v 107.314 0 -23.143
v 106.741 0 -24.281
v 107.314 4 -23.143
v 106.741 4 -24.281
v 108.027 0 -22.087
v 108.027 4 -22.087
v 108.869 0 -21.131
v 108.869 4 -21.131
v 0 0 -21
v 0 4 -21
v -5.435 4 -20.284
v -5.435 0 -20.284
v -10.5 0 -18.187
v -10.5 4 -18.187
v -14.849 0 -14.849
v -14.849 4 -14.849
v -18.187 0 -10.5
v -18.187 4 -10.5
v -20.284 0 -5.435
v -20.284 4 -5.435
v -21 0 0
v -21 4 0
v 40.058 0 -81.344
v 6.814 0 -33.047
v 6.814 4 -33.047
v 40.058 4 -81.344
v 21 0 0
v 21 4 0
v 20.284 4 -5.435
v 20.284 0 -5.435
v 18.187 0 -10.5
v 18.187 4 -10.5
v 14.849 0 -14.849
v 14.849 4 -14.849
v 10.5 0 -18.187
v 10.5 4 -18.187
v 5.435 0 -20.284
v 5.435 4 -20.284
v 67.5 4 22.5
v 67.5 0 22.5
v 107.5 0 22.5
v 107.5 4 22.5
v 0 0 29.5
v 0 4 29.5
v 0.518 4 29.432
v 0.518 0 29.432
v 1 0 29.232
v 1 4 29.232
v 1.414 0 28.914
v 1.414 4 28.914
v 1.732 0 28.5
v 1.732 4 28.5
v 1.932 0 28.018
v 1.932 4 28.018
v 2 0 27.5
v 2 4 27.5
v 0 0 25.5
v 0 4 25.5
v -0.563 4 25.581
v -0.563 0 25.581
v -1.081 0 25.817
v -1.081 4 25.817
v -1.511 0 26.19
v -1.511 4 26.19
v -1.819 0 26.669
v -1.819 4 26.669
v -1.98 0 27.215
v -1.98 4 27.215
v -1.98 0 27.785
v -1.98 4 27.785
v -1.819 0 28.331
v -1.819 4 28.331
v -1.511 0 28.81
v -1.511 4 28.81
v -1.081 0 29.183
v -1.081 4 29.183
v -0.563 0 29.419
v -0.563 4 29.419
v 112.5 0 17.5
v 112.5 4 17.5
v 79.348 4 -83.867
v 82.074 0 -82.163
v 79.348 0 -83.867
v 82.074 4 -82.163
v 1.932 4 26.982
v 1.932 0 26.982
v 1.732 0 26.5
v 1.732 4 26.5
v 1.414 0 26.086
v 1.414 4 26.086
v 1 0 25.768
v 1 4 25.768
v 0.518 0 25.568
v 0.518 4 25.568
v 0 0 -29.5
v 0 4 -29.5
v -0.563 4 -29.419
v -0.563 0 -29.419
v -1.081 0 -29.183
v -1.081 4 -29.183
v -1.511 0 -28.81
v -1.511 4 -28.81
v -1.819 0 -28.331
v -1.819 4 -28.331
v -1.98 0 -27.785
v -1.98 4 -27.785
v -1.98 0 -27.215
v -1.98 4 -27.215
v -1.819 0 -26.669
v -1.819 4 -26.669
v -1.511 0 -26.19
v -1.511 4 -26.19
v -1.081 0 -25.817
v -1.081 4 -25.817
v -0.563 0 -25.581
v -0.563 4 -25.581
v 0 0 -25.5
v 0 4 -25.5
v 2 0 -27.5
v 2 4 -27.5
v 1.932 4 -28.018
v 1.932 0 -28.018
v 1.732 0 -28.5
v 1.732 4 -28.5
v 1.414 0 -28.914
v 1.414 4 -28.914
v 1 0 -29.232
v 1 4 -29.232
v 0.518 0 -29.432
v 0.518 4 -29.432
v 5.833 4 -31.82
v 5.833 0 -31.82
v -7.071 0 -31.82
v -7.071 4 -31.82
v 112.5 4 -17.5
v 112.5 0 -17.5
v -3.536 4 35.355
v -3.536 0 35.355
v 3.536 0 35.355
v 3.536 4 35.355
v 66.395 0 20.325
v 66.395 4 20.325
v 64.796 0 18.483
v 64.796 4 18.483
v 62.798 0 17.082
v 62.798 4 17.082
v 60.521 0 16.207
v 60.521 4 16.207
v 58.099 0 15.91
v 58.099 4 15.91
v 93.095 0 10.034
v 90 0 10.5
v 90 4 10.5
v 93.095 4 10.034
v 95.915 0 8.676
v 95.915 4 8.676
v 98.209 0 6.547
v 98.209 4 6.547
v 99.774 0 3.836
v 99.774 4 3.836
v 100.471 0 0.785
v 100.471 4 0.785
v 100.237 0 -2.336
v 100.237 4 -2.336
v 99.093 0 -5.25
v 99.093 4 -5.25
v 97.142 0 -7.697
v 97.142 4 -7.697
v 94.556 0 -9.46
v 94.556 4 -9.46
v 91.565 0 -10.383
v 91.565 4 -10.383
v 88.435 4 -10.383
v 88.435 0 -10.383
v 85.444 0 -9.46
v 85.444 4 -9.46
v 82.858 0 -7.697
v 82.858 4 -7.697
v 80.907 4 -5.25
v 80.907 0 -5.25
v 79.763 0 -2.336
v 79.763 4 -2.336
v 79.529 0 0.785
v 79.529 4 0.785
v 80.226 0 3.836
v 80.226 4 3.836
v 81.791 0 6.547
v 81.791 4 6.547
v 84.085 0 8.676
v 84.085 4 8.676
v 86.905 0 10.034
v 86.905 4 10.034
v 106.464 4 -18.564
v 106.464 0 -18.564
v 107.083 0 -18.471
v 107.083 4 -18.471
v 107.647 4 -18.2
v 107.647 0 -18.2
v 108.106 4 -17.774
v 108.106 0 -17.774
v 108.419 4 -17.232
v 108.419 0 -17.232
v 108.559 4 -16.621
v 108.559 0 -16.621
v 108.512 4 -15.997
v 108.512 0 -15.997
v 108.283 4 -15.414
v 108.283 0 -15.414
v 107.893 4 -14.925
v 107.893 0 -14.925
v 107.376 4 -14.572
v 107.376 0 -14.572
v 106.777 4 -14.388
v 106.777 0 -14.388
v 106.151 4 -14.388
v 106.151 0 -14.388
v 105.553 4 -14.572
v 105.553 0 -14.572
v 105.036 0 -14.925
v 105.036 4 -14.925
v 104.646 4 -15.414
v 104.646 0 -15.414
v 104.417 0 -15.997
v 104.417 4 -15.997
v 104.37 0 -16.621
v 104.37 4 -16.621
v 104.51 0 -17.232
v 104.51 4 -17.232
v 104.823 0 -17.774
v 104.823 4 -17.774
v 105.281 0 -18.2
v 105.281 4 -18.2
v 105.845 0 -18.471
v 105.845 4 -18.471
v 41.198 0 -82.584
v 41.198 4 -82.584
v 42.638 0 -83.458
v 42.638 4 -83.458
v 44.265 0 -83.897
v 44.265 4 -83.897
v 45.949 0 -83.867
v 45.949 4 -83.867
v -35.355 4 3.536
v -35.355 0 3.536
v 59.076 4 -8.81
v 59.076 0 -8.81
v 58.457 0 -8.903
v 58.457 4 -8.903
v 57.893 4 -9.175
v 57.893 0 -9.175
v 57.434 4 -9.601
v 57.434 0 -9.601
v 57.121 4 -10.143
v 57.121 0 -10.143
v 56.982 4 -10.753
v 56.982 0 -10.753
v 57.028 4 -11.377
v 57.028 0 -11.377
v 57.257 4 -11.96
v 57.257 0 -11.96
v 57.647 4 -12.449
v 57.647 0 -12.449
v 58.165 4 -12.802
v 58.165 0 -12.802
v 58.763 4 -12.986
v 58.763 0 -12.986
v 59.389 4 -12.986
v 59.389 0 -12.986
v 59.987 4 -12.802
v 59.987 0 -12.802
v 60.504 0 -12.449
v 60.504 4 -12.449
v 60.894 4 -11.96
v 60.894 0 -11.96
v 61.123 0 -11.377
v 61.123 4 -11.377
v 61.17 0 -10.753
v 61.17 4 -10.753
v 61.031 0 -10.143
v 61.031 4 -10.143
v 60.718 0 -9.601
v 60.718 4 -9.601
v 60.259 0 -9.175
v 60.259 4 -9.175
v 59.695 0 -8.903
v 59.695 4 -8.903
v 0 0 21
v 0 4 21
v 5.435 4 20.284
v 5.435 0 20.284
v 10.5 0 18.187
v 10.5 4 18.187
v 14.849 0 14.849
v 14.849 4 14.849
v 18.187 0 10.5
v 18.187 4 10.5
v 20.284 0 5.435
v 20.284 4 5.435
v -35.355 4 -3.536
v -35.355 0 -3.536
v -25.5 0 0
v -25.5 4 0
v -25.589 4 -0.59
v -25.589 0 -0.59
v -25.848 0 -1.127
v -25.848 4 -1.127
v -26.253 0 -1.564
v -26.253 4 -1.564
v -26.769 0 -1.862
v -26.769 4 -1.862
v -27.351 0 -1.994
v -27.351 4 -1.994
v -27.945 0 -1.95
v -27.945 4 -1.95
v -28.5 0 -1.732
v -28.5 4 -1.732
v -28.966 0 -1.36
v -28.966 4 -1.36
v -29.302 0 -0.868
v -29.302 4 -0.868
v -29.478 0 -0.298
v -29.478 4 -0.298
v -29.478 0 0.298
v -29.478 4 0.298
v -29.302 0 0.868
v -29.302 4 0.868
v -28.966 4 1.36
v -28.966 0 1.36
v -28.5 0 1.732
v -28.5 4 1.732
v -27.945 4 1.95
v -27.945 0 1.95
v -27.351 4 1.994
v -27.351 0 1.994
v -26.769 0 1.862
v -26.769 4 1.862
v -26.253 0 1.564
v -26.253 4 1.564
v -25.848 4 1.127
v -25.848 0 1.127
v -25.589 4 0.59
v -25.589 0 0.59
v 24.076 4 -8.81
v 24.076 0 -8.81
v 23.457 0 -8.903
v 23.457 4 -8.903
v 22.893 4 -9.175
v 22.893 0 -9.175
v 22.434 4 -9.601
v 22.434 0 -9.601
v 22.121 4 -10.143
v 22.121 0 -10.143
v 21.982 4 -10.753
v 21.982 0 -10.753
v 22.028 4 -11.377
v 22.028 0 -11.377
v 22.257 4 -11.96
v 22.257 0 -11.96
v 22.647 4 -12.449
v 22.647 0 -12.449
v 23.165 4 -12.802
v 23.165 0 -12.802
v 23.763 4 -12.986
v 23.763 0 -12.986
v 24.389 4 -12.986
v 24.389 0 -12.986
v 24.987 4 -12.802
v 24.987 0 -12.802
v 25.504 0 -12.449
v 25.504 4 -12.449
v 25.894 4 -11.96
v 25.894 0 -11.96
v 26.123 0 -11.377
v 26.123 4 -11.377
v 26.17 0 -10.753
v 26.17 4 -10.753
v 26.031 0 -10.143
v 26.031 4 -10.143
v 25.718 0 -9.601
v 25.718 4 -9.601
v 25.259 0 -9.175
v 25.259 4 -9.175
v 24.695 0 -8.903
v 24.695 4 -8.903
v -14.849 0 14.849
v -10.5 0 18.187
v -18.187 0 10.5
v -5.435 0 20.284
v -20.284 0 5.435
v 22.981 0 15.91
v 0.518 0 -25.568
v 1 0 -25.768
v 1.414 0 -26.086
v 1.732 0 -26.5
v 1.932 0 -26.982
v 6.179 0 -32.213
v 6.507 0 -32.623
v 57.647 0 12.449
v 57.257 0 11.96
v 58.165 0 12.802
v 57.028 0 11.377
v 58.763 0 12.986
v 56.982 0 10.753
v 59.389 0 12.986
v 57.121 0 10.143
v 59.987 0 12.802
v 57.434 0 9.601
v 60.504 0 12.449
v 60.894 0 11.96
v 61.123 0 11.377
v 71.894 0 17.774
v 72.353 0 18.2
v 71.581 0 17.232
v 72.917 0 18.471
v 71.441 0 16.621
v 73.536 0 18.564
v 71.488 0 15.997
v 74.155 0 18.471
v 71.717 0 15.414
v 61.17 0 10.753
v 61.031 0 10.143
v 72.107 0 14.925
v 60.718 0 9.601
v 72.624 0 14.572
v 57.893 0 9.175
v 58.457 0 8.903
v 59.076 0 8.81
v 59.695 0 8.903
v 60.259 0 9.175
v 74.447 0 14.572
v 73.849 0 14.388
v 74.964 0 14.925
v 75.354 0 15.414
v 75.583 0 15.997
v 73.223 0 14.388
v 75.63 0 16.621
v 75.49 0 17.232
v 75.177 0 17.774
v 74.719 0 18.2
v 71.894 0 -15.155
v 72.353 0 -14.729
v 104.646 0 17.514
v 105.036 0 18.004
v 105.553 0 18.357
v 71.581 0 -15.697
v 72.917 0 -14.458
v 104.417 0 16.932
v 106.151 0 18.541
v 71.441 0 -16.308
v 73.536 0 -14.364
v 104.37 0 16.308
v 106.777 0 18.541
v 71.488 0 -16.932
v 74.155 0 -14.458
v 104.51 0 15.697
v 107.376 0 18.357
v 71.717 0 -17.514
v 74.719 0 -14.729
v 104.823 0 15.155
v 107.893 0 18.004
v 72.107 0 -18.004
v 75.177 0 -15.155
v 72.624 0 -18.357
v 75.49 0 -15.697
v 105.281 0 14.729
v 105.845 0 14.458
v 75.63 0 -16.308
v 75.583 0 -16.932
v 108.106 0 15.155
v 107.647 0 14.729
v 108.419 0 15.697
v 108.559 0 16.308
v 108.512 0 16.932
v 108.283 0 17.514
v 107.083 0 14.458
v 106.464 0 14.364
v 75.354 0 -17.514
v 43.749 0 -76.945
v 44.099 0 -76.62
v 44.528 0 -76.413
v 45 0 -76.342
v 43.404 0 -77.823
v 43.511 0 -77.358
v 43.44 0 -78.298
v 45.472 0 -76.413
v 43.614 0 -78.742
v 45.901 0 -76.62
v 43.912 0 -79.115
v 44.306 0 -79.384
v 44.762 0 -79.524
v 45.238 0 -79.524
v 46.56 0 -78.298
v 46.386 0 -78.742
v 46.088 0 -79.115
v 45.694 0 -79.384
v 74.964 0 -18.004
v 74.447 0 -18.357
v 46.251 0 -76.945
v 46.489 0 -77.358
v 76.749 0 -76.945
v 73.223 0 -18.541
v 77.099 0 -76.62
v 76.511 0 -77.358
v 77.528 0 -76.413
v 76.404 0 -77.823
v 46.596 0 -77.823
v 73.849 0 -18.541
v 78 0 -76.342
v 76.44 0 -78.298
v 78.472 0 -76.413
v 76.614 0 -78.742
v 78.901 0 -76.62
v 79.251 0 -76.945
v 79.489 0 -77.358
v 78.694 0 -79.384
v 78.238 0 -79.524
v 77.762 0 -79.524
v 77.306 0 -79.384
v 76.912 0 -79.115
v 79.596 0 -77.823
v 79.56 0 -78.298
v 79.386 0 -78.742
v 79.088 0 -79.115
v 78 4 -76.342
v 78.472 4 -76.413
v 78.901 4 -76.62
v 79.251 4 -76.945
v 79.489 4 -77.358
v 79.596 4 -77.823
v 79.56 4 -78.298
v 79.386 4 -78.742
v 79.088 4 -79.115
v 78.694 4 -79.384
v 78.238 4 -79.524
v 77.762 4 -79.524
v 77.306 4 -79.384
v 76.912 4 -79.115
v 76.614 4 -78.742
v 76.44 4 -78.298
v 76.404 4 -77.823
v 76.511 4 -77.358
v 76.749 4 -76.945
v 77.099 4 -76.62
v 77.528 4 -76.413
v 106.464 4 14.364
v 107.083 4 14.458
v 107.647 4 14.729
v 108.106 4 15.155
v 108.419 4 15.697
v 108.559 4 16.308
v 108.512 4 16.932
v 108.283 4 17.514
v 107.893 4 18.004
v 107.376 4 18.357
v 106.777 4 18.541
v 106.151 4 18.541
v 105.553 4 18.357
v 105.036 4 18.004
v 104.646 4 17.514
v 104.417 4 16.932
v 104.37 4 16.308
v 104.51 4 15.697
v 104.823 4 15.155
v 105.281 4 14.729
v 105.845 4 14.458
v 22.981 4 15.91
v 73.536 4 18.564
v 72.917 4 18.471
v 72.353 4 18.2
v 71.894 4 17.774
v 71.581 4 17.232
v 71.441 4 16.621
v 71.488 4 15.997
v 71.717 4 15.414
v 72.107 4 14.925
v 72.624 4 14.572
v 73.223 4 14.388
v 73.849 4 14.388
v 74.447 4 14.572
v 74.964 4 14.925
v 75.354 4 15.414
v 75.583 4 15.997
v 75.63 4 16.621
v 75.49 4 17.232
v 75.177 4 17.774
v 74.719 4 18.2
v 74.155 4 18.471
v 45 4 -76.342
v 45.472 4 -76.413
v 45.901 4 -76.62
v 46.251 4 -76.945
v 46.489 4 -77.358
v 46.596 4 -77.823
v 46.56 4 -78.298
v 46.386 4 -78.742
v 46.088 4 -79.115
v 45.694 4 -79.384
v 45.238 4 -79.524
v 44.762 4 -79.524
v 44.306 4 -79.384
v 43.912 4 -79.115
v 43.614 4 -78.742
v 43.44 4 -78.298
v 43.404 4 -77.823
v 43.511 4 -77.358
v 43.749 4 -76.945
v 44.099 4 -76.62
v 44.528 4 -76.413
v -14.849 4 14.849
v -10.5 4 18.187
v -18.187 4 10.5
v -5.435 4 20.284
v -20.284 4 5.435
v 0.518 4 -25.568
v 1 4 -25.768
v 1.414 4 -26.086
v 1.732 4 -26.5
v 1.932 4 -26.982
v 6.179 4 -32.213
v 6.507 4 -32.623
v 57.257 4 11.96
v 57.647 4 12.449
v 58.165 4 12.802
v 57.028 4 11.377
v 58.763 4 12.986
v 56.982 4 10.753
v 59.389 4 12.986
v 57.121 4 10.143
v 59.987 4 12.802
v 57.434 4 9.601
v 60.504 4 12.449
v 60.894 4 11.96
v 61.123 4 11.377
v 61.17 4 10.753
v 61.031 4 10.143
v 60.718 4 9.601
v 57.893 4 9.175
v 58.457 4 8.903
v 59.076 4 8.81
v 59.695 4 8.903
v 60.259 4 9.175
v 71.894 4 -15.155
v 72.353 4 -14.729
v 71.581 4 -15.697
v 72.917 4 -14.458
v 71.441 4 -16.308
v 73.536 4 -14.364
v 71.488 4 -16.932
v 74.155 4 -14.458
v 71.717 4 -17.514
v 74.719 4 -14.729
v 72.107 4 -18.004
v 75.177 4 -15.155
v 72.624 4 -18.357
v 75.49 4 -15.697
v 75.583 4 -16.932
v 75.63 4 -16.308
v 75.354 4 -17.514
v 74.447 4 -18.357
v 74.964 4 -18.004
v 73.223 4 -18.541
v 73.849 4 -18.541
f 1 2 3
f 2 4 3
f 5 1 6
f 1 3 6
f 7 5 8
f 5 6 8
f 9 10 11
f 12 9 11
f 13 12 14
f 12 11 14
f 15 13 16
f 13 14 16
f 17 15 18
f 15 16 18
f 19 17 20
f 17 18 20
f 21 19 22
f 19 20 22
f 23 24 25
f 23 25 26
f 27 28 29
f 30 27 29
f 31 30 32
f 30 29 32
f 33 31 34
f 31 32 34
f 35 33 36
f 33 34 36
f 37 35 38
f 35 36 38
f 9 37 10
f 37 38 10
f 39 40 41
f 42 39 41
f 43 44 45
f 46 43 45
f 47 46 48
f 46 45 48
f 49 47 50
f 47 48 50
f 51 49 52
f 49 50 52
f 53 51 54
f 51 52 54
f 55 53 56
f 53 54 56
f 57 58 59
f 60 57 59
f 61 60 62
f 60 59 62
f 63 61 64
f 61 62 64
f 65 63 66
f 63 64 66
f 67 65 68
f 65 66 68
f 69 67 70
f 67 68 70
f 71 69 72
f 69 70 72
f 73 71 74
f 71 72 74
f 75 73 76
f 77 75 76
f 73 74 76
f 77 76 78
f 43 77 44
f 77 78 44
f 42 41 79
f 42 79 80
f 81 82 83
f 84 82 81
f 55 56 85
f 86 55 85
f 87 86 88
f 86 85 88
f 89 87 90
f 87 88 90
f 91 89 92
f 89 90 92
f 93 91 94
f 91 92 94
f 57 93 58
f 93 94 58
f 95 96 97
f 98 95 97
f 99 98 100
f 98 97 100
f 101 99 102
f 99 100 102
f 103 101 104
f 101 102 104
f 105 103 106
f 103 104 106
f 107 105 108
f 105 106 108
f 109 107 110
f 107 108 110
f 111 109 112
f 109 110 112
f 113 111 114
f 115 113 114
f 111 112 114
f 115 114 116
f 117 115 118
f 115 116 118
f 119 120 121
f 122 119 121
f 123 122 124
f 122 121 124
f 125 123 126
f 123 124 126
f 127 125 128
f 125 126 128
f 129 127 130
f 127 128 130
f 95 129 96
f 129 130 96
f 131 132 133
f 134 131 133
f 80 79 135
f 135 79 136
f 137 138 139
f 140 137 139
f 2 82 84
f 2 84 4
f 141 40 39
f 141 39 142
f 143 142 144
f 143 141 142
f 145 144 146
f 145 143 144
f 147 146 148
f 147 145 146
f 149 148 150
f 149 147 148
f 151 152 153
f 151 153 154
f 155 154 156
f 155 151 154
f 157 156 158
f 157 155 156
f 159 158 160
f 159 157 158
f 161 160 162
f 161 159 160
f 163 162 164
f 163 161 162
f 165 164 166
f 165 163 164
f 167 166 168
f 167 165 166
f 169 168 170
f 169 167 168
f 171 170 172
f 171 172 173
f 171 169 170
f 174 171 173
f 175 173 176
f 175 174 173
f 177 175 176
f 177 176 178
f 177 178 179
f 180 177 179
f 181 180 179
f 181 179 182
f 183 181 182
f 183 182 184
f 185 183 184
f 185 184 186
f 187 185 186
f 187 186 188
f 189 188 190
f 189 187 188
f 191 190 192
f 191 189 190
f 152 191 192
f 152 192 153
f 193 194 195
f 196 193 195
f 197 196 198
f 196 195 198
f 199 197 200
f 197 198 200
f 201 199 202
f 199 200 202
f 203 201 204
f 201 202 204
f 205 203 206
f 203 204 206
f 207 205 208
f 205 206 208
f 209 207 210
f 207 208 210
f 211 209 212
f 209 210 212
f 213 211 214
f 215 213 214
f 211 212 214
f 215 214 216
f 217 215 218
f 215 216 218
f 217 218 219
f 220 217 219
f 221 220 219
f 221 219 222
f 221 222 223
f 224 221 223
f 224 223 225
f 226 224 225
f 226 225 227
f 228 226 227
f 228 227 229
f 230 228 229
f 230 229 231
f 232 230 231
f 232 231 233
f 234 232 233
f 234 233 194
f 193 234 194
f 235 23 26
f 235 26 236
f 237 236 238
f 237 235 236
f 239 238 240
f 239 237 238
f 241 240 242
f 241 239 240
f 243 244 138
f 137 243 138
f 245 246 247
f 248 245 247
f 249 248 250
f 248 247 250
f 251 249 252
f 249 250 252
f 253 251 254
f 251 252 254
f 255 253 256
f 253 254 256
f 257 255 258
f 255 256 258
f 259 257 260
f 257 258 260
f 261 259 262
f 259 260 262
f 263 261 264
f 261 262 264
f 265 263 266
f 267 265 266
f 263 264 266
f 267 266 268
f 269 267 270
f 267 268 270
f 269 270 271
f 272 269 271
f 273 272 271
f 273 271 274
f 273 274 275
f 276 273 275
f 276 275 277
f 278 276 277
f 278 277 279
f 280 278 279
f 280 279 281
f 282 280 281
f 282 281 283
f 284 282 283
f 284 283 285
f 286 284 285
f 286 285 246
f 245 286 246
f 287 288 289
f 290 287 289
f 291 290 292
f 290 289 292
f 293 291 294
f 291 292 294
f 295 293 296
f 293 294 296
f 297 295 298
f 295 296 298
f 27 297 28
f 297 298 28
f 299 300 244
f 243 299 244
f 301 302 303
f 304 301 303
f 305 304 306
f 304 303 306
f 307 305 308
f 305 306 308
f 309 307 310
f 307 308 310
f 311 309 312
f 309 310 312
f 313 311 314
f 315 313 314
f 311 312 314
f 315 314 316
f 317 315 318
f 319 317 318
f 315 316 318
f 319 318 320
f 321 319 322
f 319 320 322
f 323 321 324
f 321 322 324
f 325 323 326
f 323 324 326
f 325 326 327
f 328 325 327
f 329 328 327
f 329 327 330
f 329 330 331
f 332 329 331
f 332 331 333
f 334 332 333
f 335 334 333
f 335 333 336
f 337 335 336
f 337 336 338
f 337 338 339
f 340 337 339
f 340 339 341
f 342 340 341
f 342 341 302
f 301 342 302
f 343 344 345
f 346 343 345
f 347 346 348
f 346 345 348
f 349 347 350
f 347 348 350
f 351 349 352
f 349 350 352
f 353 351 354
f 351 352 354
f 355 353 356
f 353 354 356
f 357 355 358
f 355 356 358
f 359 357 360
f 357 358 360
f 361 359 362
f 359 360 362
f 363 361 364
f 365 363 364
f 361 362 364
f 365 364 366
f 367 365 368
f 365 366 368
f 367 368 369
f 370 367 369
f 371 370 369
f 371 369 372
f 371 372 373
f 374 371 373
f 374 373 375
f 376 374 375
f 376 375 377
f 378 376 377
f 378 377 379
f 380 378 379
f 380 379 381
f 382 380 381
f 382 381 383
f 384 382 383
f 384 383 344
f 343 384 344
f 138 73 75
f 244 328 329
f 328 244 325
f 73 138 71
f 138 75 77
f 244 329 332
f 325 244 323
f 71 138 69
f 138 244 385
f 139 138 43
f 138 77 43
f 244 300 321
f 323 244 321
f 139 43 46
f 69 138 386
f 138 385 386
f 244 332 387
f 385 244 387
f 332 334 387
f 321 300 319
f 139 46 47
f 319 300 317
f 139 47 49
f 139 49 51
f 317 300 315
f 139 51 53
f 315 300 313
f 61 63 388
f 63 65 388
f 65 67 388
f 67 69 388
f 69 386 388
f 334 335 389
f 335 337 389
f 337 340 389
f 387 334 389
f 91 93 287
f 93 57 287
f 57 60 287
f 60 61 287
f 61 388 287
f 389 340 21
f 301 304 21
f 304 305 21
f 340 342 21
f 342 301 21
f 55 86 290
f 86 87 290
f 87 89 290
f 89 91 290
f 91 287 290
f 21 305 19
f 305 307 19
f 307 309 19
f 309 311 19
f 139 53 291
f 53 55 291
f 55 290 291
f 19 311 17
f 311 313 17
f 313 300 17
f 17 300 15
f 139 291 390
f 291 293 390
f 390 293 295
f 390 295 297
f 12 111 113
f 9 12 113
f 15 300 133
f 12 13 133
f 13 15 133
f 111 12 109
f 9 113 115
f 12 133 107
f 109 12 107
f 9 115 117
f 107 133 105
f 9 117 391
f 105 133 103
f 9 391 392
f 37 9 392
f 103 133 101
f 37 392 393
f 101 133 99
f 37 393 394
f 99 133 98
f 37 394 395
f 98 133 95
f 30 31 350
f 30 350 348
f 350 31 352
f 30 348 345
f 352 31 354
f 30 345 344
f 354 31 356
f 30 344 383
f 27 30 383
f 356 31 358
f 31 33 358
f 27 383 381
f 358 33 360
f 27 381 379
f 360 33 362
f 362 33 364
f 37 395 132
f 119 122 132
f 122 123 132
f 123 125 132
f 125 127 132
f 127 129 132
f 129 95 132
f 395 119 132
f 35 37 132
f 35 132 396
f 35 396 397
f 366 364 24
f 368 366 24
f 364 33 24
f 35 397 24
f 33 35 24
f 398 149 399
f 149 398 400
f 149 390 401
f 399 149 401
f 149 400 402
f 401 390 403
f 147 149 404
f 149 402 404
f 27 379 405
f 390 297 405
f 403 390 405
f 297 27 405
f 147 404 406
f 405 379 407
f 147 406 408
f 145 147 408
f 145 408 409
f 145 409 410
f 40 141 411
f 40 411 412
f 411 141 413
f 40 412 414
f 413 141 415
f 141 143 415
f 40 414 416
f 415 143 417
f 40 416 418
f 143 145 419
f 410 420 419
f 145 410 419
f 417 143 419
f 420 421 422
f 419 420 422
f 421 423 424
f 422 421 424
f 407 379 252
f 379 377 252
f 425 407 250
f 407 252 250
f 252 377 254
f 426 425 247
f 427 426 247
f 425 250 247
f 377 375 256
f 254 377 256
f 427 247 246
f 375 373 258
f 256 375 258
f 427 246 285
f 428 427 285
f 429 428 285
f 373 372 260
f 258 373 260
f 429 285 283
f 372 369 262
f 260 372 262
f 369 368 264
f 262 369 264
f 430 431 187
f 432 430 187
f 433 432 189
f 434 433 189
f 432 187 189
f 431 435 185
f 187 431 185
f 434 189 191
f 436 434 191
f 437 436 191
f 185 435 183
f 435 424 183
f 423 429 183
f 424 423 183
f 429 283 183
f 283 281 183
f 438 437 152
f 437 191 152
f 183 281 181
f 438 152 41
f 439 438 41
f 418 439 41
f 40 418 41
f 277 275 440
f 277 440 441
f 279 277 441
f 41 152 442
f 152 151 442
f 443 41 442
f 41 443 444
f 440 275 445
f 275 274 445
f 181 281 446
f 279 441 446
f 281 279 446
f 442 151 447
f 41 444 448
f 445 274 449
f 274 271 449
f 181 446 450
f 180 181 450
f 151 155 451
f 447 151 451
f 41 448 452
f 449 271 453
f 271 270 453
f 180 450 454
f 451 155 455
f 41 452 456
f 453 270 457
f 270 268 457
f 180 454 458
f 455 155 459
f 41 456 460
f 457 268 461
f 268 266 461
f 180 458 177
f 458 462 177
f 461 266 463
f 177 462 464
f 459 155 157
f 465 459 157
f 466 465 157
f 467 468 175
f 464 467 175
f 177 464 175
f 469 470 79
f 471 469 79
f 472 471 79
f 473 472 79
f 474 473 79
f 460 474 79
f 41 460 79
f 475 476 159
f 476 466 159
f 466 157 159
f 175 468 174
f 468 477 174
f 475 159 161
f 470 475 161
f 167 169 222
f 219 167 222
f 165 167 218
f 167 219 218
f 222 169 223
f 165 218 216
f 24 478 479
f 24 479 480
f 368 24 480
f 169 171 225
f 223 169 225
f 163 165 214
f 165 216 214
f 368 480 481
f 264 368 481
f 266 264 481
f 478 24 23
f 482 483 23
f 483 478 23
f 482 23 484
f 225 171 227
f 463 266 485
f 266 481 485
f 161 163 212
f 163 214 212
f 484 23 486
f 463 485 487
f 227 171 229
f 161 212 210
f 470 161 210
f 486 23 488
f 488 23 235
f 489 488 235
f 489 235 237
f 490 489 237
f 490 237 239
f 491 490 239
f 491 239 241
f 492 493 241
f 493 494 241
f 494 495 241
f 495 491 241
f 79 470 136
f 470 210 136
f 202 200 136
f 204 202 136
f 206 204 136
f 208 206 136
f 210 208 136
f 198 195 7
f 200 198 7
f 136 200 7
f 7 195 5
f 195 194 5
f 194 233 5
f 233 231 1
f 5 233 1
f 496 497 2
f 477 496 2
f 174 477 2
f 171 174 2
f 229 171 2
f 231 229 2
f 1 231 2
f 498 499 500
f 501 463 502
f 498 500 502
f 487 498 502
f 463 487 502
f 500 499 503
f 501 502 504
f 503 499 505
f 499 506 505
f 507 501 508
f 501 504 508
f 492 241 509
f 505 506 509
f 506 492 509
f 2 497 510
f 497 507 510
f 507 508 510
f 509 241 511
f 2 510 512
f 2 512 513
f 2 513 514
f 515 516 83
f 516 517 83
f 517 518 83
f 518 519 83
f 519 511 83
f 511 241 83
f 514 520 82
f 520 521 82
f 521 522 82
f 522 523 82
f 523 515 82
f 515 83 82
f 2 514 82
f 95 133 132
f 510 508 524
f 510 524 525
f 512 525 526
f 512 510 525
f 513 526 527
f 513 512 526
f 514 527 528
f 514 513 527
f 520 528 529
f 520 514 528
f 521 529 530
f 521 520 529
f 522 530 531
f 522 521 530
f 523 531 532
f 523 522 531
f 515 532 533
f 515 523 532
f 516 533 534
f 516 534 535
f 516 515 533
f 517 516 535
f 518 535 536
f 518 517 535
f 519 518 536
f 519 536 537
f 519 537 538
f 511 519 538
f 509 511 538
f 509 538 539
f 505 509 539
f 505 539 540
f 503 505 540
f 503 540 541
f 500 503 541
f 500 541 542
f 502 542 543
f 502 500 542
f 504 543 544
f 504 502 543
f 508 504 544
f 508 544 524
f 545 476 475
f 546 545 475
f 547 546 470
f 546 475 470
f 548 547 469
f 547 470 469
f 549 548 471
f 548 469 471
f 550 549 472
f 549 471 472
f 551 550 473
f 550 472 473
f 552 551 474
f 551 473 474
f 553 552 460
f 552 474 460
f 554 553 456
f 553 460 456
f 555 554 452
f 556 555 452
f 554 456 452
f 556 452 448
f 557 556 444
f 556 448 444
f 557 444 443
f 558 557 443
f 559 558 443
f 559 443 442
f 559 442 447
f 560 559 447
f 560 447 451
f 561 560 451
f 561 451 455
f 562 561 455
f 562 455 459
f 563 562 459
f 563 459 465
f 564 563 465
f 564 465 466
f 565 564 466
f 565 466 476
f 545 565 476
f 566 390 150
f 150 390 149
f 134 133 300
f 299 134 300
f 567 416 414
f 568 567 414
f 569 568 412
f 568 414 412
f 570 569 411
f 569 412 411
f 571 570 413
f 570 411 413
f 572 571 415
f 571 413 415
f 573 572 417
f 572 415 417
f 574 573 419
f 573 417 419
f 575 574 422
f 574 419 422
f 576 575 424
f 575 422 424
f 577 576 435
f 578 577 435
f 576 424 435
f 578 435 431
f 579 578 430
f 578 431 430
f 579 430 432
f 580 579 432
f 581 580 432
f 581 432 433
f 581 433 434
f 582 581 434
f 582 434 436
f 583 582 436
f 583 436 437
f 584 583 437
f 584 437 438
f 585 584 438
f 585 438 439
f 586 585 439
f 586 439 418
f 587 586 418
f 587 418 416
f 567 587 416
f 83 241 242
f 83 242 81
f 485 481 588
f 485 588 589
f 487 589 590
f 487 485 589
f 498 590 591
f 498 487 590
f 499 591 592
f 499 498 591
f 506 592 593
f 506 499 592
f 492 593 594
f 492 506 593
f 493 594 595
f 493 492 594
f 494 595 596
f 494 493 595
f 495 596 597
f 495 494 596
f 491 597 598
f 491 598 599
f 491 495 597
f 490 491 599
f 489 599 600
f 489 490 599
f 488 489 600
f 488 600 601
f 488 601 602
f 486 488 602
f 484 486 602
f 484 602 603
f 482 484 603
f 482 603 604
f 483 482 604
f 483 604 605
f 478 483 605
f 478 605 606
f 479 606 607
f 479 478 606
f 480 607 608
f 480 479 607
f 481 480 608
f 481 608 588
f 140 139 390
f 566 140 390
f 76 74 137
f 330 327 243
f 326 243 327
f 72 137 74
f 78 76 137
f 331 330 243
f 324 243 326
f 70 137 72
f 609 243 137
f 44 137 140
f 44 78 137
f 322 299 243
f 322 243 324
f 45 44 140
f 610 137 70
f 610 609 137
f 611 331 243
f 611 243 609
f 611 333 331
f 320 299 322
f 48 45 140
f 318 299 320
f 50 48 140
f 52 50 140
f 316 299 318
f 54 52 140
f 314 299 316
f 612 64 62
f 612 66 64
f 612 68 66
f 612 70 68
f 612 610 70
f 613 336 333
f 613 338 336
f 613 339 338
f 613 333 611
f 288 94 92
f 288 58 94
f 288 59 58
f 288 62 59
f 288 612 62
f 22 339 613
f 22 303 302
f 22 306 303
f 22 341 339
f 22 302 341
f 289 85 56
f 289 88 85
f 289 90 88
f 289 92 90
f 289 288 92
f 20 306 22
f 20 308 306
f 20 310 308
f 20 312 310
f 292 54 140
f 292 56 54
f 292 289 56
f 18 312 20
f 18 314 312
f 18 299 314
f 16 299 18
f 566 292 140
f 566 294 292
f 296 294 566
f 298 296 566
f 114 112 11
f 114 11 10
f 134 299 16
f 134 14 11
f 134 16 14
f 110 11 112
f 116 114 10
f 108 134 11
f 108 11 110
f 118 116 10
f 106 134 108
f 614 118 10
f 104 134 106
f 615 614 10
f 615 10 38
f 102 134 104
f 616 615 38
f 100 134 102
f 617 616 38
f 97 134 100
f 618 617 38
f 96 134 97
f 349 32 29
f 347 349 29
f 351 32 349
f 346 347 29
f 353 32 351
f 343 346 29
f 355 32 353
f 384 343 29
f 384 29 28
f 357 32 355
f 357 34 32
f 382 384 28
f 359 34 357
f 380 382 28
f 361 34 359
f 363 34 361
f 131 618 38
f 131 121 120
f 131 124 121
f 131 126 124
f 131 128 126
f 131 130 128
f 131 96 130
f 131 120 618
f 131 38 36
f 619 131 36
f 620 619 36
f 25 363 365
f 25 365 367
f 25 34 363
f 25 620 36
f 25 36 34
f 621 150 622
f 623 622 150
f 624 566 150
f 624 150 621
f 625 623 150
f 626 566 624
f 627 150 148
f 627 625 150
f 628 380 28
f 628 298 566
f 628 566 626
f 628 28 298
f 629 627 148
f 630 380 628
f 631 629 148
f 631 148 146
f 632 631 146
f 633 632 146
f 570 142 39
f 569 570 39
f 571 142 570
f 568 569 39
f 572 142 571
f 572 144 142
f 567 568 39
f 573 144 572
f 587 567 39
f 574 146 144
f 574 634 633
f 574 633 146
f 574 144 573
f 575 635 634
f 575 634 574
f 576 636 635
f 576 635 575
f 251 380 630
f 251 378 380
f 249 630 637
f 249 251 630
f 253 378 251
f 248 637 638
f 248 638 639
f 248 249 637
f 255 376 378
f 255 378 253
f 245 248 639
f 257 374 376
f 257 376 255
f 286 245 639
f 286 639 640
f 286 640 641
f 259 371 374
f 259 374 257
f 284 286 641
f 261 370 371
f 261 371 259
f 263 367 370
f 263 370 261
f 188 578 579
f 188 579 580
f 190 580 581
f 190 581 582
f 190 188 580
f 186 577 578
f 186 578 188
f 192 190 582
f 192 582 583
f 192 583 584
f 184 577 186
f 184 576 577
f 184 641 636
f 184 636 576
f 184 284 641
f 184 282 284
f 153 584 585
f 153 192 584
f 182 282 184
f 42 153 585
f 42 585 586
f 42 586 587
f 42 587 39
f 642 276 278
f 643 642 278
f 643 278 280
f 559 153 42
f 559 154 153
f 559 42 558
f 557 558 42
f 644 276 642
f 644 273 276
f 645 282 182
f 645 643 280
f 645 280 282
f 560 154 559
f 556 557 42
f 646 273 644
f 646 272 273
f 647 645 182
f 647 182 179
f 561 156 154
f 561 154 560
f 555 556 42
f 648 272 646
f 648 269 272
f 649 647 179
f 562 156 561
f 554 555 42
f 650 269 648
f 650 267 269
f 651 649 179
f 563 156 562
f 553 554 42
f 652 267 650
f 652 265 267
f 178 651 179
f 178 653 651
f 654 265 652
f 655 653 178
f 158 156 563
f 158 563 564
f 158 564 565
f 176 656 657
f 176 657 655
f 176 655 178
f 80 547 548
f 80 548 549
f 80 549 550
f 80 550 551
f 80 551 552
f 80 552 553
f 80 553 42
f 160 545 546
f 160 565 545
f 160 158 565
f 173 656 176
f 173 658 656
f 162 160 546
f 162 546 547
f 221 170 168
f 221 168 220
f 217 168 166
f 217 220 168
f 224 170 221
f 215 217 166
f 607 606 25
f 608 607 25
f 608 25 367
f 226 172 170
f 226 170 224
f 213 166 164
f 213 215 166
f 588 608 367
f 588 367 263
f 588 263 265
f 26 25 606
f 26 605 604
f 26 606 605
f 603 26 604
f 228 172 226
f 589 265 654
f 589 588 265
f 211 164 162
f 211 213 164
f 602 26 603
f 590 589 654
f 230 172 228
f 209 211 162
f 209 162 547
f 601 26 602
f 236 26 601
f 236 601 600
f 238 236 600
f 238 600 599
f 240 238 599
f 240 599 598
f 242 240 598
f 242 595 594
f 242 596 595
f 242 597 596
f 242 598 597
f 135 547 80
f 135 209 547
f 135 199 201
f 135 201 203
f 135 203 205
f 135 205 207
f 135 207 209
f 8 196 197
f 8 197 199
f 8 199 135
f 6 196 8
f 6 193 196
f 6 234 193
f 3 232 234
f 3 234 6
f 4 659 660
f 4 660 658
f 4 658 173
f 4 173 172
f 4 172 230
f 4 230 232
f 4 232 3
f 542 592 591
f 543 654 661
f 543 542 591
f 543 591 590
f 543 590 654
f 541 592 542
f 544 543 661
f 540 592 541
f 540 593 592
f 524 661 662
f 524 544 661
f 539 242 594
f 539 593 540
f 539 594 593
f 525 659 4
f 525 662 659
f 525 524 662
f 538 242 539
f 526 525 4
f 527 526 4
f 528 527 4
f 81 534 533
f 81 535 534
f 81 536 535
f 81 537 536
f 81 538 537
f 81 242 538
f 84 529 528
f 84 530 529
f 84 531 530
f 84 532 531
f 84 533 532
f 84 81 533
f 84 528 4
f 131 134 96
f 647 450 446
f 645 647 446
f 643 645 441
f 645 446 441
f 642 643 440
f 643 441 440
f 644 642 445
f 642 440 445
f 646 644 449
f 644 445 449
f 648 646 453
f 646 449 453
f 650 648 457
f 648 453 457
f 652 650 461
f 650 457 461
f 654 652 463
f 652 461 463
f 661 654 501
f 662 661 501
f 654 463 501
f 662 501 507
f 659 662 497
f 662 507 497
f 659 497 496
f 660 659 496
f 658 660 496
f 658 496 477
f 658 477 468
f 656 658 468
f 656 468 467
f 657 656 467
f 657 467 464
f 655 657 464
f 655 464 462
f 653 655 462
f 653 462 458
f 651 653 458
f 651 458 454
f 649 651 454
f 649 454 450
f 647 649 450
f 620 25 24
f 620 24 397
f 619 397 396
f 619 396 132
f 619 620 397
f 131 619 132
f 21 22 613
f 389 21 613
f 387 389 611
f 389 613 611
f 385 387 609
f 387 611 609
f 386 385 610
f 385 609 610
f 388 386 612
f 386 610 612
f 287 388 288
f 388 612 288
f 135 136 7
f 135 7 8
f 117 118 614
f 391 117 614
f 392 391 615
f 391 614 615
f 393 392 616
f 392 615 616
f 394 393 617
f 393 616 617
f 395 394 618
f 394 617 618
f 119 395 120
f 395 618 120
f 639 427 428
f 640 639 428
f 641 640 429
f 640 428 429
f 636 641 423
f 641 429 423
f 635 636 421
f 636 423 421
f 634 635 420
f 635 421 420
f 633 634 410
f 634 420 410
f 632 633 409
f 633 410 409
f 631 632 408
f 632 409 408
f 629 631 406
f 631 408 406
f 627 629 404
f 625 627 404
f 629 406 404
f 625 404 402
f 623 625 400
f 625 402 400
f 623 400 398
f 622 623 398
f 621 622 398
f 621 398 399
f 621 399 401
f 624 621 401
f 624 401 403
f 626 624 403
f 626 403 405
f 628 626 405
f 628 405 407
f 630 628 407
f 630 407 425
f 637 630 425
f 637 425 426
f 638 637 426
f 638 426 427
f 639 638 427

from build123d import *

# Parameters (mm, degrees)
SKETCH_1_R          = 2.1
SKETCH_1_R_2        = 10.5
SKETCH_1_R_3        = 10
EXTRUDE_1_DEPTH     = 4
CHAMFER_1_SIZE      = 5
FILLET_1_R          = 10
SKETCH_2_R          = 2.1
CUT_EXTRUDE_1_DEPTH = 10
EXTRUDE_START       = -4
SKETCH_3_R          = 1.6
EXTRUDE_2_DEPTH     = 4
FILLET_2_R          = 3
FILLET_3_R          = 11
SKETCH_4_R          = 1.6
EXTRUDE_3_DEPTH     = 4
FILLET_4_R          = 10
CHAMFER_2_SIZE      = 2
CHAMFER_2_SIZE2     = 1.851556395
FILLET_5_R          = 10
SKETCH_5_R          = 17.5
CUT_EXTRUDE_2_DEPTH = 10
SKETCH_7_R          = 2.1
EXTRUDE_9_DEPTH     = 4
EXTRUDE_10_DEPTH    = 8
EXTRUDE_11_DEPTH    = 4


with BuildPart() as part:
    # 草图1 → 凸台-拉伸1 (new body)
    with BuildSketch(Plane(origin=(0, 0, 0), x_dir=(1, 0, 0), z_dir=(0, 1, 0))):
        Polygon((0, 31.819805153), (-31.819805153, 0), (0, -31.819805153), (15.909902577, -15.909902577), (67.5, -15.909902577), (67.5, -22.5), (112.5, -22.5), (112.5, 22.5), (67.5, 22.5), (67.5, 15.909902577), (15.909902577, 15.909902577), align=None)
        with Locations(Location((0, 14, 0), (0, 0, 270))):
            Circle(SKETCH_1_R, mode=Mode.SUBTRACT)
        with Locations(Location((14, 0, 0), (0, 0, 270))):
            Circle(SKETCH_1_R, mode=Mode.SUBTRACT)
        with Locations(Location((0, -14, 0), (0, 0, 270))):
            Circle(SKETCH_1_R, mode=Mode.SUBTRACT)
        with Locations(Location((-14, 0, 0), (0, 0, 270))):
            Circle(SKETCH_1_R, mode=Mode.SUBTRACT)
        with Locations(Location((90, 0, 0), (0, 0, 270))):
            Circle(SKETCH_1_R_2, mode=Mode.SUBTRACT)
        with Locations(Location((0, 22.5, 0), (0, 0, 270))):
            Circle(SKETCH_1_R, mode=Mode.SUBTRACT)
        with Locations(Location((0, -22.5, 0), (0, 0, 270))):
            Circle(SKETCH_1_R, mode=Mode.SUBTRACT)
        with Locations(Location((0, 0, 0), (0, 0, 270))):
            Circle(SKETCH_1_R_3, mode=Mode.SUBTRACT)
        with Locations(Location((-22.5, 0, 0), (0, 0, 270))):
            Circle(SKETCH_1_R, mode=Mode.SUBTRACT)
    extrude(amount=EXTRUDE_1_DEPTH)

    # 倒角1
    chamfer_1_edges = [part.edges().sort_by_distance(p)[0] for p in [
        (112.5, 2, -22.5),
        (112.5, 2, 22.5),
        (0, 2, 31.819805153),
        (-31.819805153, 2, 0),
        (0, 2, -31.819805153),
    ]]
    chamfer(chamfer_1_edges, length=CHAMFER_1_SIZE)

    # 圆角1
    # the kernel refuses this fillet: 10 mm, written as the material it adds along each edge
    with BuildSketch(Plane(origin=(15.909902577, 0, -15.909902577), x_dir=(-0.707106781186552, 0, -0.707106781186543), z_dir=(0, 1, 0))) as fillet_1_piece_1:
        with BuildLine():
            CenterArc((FILLET_1_R * 0.414213562373, -FILLET_1_R), FILLET_1_R, 90, 45)
            Line((-FILLET_1_R * 0.292893218813, -FILLET_1_R * 0.292893218813), (-FILLET_1_R * 0.307035354437, -FILLET_1_R * 0.27875108319))
            Line((-FILLET_1_R * 0.307035354437, -FILLET_1_R * 0.27875108319), (-FILLET_1_R * 0.00828427124746, FILLET_1_R * 0.02))
            Line((-FILLET_1_R * 0.00828427124746, FILLET_1_R * 0.02), (FILLET_1_R * 0.414213562373, FILLET_1_R * 0.02))
            Line((FILLET_1_R * 0.414213562373, FILLET_1_R * 0.02), (FILLET_1_R * 0.414213562373, 0))
        make_face()
    extrude(amount=4)
    with BuildSketch(Plane(origin=(15.909902577, 0, 15.909902577), x_dir=(-0.7071067811865422, 0, 0.707106781186553), z_dir=(0, 1, 0))) as fillet_1_piece_2:
        with BuildLine():
            CenterArc((FILLET_1_R * 0.414213562373, FILLET_1_R), FILLET_1_R, 225, 45)
            Line((-FILLET_1_R * 0.292893218813, FILLET_1_R * 0.292893218813), (-FILLET_1_R * 0.307035354437, FILLET_1_R * 0.27875108319))
            Line((-FILLET_1_R * 0.307035354437, FILLET_1_R * 0.27875108319), (-FILLET_1_R * 0.00828427124746, -FILLET_1_R * 0.02))
            Line((-FILLET_1_R * 0.00828427124746, -FILLET_1_R * 0.02), (FILLET_1_R * 0.414213562373, -FILLET_1_R * 0.02))
            Line((FILLET_1_R * 0.414213562373, -FILLET_1_R * 0.02), (FILLET_1_R * 0.414213562373, 0))
        make_face()
    extrude(amount=4)
    with BuildSketch(Plane(origin=(67.5, 0, 15.909902577), x_dir=(-1, 0, 0), z_dir=(0, 1, 0))) as fillet_1_piece_3:
        with BuildLine():
            CenterArc((9.400668296, 10), FILLET_1_R, 199.937217397, 70.062782603)
            Line((0, 6.590097423), (-0.188013366, 6.521899372))
            ThreePointArc((-0.188013366, 6.521899372), (-0.2, 3.295048712), (-0.2, 0))
            Line((-0.2, 0), (0, -0.2))
            Line((0, -0.2), (9.400668296, -0.2))
            Line((9.400668296, -0.2), (9.400668296, 0))
        make_face()
    extrude(amount=4)
    with BuildSketch(Plane(origin=(67.5, 0, -15.909902577), x_dir=(-1, 0, 0), z_dir=(0, 1, 0))) as fillet_1_piece_4:
        with BuildLine():
            CenterArc((9.400668296, -10), FILLET_1_R, 90, 70.062782603)
            Line((0, -6.590097423), (-0.188013366, -6.521899372))
            ThreePointArc((-0.188013366, -6.521899372), (-0.2, -3.295048712), (-0.2, 0))
            Line((-0.2, 0), (0, 0.2))
            Line((0, 0.2), (9.400668296, 0.2))
            Line((9.400668296, 0.2), (9.400668296, 0))
        make_face()
    extrude(amount=4)

    # 草图2 → 切除-拉伸1 (cut)
    with BuildSketch(Plane.XZ):
        with Locations(Location((106.464466094, 16.464466094, 0), (0, 0, 270))):
            Circle(SKETCH_2_R)
        with Locations(Location((106.464466094, -16.464466094, 0), (0, 0, 270))):
            Circle(SKETCH_2_R)
        with Locations(Location((73.535533906, -16.464466094, 0), (0, 0, 90))):
            Circle(SKETCH_2_R)
        with Locations(Location((73.535533906, 16.464466094, 0), (0, 0, 90))):
            Circle(SKETCH_2_R)
        with Locations(Location((24.075684952, 10.909902577, 0), (0, 0, 270))):
            Circle(SKETCH_2_R)
        with Locations(Location((59.075684952, 10.909902577, 0), (0, 0, 270))):
            Circle(SKETCH_2_R)
        with Locations(Location((59.075684952, -10.909902577, 0), (0, 0, 90))):
            Circle(SKETCH_2_R)
        with Locations(Location((24.075684952, -10.909902577, 0), (0, 0, 90))):
            Circle(SKETCH_2_R)
    extrude(amount=-CUT_EXTRUDE_1_DEPTH, mode=Mode.SUBTRACT)

    # 草图3 → 凸台-拉伸2 (add)
    with BuildSketch(Plane(origin=(0, 4, 0), x_dir=(1, 0, 0), z_dir=(0, 1, 0)).offset(EXTRUDE_START)):
        with BuildLine():
            Line((3.535533906, 28.284271247), (40.057636417, 81.344203773))
            ThreePointArc((40.057636417, 81.344203773), (45.94930127, 83.86671265), (50.75784592, 79.629654221))
            Line((50.75784592, 79.629654221), (67.5, 22.5))
            ThreePointArc((67.5, 22.5), (63.839583189, 17.721525883), (58.099331704, 15.909902577))
            Line((58.099331704, 15.909902577), (20.0520382, 15.909902577))
            ThreePointArc((20.0520382, 15.909902577), (16.225203877, 16.671107252), (12.980970389, 18.838834765))
            Line((12.980970389, 18.838834765), (3.535533906, 28.284271247))
        make_face()
        with Locations(Location((45, 77.942286341, 0), (0, 0, 270))):
            Circle(SKETCH_3_R, mode=Mode.SUBTRACT)
        Polygon((16.491758356, 29.470182421), (43.526560522, 68.746803428), (56.080145943, 25.909902577), (20.0520382, 25.909902577), align=None, mode=Mode.SUBTRACT)
    extrude(amount=EXTRUDE_2_DEPTH)

    # 圆角2
    fillet_2_edges = [part.edges().sort_by_distance(p)[0] for p in [
        (16.491758356, 2, -29.470182421),
        (43.526560522, 2, -68.746803428),
        (56.080145943, 2, -25.909902577),
        (20.0520382, 2, -25.909902577),
    ]]
    fillet(fillet_2_edges, radius=FILLET_2_R)

    # 圆角3
    fillet_3_edges = [part.edges().sort_by_distance(p)[0] for p in [
        (67.5, 2, -22.5),
        (3.535533906, 2, -28.284271247),
    ]]
    fillet(fillet_3_edges, radius=FILLET_3_R)

    # 草图4 → 凸台-拉伸3 (add)
    with BuildSketch(Plane(origin=(0, 4, 0), x_dir=(1, 0, 0), z_dir=(0, 1, 0)).offset(EXTRUDE_START)):
        with BuildLine():
            Line((45.94930127, 83.86671265), (81.347717681, 83.86671265))
            Line((81.347717681, 83.86671265), (107.5, 22.5))
            Line((107.5, 22.5), (97.716806526, 22.5))
            Line((97.716806526, 22.5), (75.4, 74.86671265))
            Line((75.4, 74.86671265), (52.153651701, 74.86671265))
            Line((52.153651701, 74.86671265), (50.75784592, 79.629654221))
            ThreePointArc((50.75784592, 79.629654221), (48.966689034, 82.443994695), (45.94930127, 83.86671265))
        make_face()
        with Locations(Location((78, 77.942286341, 0), (0, 0, 270))):
            Circle(SKETCH_4_R, mode=Mode.SUBTRACT)
    extrude(amount=EXTRUDE_3_DEPTH)

    # 圆角4
    fillet_4_edges = [part.edges().sort_by_distance(p)[0] for p in [
        (97.716806526, 2, -22.5),
        (75.4, 2, -74.86671265),
        (52.153651701, 2, -74.86671265),
    ]]
    fillet(fillet_4_edges, radius=FILLET_4_R)

    # 倒角2
    chamfer_2_edges = [part.edges().sort_by_distance(p)[0] for p in [
        (81.347717681, 2, -83.86671265),
    ]]
    chamfer_2_side = [part.faces().sort_by_distance(p)[0] for p in [
        (63.648509476, 2, -83.86671265),
    ]]
    chamfer(chamfer_2_edges, length=CHAMFER_2_SIZE, length2=CHAMFER_2_SIZE2, reference=chamfer_2_side[0])

    # 圆角5
    fillet_5_edges = [part.edges().sort_by_distance(p)[0] for p in [
        (107.5, 2, -22.5),
    ]]
    fillet(fillet_5_edges, radius=FILLET_5_R)

    # 草图5 → 切除-拉伸2 (cut)
    with BuildSketch(Plane(origin=(0, 4, 0), x_dir=(1, 0, 0), z_dir=(0, 1, 0))):
        with Locations(Location((0, 0, 0), (0, 0, 270))):
            Circle(SKETCH_5_R)
    extrude(amount=-CUT_EXTRUDE_2_DEPTH, mode=Mode.SUBTRACT)

    # 草图7 → 凸台-拉伸9 (add)
    with BuildSketch(Plane(origin=(0, 4, 0), x_dir=(1, 0, 0), z_dir=(0, 1, 0)).offset(EXTRUDE_START)):
        with BuildLine():
            ThreePointArc((20.0520382, -15.909902577), (16.225203877, -16.671107252), (12.980970389, -18.838834765))
            Line((12.980970389, -18.838834765), (3.535533906, -28.284271247))
            Line((3.535533906, -28.284271247), (-3.535533906, -28.284271247))
            Line((-3.535533906, -28.284271247), (-28.284271247, -3.535533906))
            Line((-28.284271247, -3.535533906), (-28.284271247, 3.535533906))
            Line((-28.284271247, 3.535533906), (-3.535533906, 28.284271247))
            Line((-3.535533906, 28.284271247), (-2.246903538, 28.284271247))
            ThreePointArc((-2.246903538, 28.284271247), (2.162794465, 29.20684283), (5.832808457, 31.819805153))
            Line((5.832808457, 31.819805153), (-7.071067812, 31.819805153))
            Line((-7.071067812, 31.819805153), (-35.355339059, 3.535533906))
            Line((-35.355339059, 3.535533906), (-35.355339059, -3.535533906))
            Line((-35.355339059, -3.535533906), (-3.535533906, -35.355339059))
            Line((-3.535533906, -35.355339059), (3.535533906, -35.355339059))
            Line((3.535533906, -35.355339059), (22.980970389, -15.909902577))
            Line((22.980970389, -15.909902577), (20.0520382, -15.909902577))
        make_face()
        with Locations((0, -22.5)):
            Circle(SKETCH_7_R)
        with Locations((0, 22.5)):
            Circle(SKETCH_7_R)
        with Locations((-22.5, 0)):
            Circle(SKETCH_7_R)
        with Locations((24.075684952, -10.909902577)):
            Circle(SKETCH_7_R)
    extrude(amount=EXTRUDE_9_DEPTH)


with BuildPart() as body_2:
    # 草图9 → 凸台-拉伸10 (new body)
    with BuildSketch(Plane(origin=(0, 4, 0), x_dir=(1, 0, 0), z_dir=(0, 1, 0))):
        with BuildLine():
            ThreePointArc((2, 27.5), (1.414213562, 28.914213562), (0, 29.5))
            Line((0, 29.5), (0, 25.5))
            ThreePointArc((0, 25.5), (1.414213562, 26.085786438), (2, 27.5))
        make_face()
        with BuildLine():
            Line((0, 25.5), (0, 29.5))
            ThreePointArc((0, 29.5), (-2, 27.5), (0, 25.5))
        make_face()
        with BuildLine():
            ThreePointArc((21, 0), (14.849242405, 14.849242405), (0, 21))
            Line((0, 21), (0, 17.5))
            ThreePointArc((0, 17.5), (12.374368671, 12.374368671), (17.5, 0))
            ThreePointArc((17.5, 0), (12.374368671, -12.374368671), (0, -17.5))
            Line((0, -17.5), (0, -21))
            ThreePointArc((0, -21), (14.849242405, -14.849242405), (21, 0))
        make_face()
        with BuildLine():
            Line((0, 17.5), (0, 21))
            ThreePointArc((0, 21), (-14.849242405, 14.849242405), (-21, 0))
            Line((-21, 0), (-17.5, 0))
            ThreePointArc((-17.5, 0), (-12.374368671, 12.374368671), (0, 17.5))
        make_face()
        with BuildLine():
            Line((-17.5, 0), (-21, 0))
            ThreePointArc((-21, 0), (-14.849242405, -14.849242405), (0, -21))
            Line((0, -21), (0, -17.5))
            ThreePointArc((0, -17.5), (-12.374368671, -12.374368671), (-17.5, 0))
        make_face()
        with BuildLine():
            Line((0, 0), (0, 17.5))
            ThreePointArc((0, 17.5), (-12.374368671, 12.374368671), (-17.5, 0))
            Line((-17.5, 0), (0, 0))
        make_face()
        with BuildLine():
            Line((0, -17.5), (0, 0))
            Line((0, 0), (-17.5, 0))
            ThreePointArc((-17.5, 0), (-12.374368671, -12.374368671), (0, -17.5))
        make_face()
        with BuildLine():
            ThreePointArc((17.5, 0), (12.374368671, 12.374368671), (0, 17.5))
            Line((0, 17.5), (0, 0))
            Line((0, 0), (0, -17.5))
            ThreePointArc((0, -17.5), (12.374368671, -12.374368671), (17.5, 0))
        make_face()
        with BuildLine():
            ThreePointArc((-29.5, 0), (-27.5, -2), (-25.5, 0))
            Line((-25.5, 0), (-29.5, 0))
        make_face()
        with BuildLine():
            Line((-29.5, 0), (-25.5, 0))
            ThreePointArc((-25.5, 0), (-27.5, 2), (-29.5, 0))
        make_face()
        with BuildLine():
            ThreePointArc((2, -27.5), (1.414213562, -26.085786438), (0, -25.5))
            Line((0, -25.5), (0, -29.5))
            ThreePointArc((0, -29.5), (1.414213562, -28.914213562), (2, -27.5))
        make_face()
        with BuildLine():
            Line((0, -29.5), (0, -25.5))
            ThreePointArc((0, -25.5), (-2, -27.5), (0, -29.5))
        make_face()
    extrude(amount=-EXTRUDE_10_DEPTH)


with BuildPart() as part_1:
    add(part.part)

    # Combine 1: cut body 2
    add(body_2.part, mode=Mode.SUBTRACT)

    # 草图10 → 凸台-拉伸11 (add)
    with BuildSketch(Plane(origin=(0, 4, 0), x_dir=(1, 0, 0), z_dir=(0, 1, 0))):
        Polygon((64.860362007, 78.786003649), (37.290552299, 66.389765699), (10.816007298, 26.699675726), (34.20335455, 14.425182396), (66.604419696, 20.562429061), (97.537214988, 20.562429061), (99.113349063, 32.87889421), (78.415005872, 73.577223442), align=None)
    extrude(amount=-EXTRUDE_11_DEPTH)


solid = part_1.part
